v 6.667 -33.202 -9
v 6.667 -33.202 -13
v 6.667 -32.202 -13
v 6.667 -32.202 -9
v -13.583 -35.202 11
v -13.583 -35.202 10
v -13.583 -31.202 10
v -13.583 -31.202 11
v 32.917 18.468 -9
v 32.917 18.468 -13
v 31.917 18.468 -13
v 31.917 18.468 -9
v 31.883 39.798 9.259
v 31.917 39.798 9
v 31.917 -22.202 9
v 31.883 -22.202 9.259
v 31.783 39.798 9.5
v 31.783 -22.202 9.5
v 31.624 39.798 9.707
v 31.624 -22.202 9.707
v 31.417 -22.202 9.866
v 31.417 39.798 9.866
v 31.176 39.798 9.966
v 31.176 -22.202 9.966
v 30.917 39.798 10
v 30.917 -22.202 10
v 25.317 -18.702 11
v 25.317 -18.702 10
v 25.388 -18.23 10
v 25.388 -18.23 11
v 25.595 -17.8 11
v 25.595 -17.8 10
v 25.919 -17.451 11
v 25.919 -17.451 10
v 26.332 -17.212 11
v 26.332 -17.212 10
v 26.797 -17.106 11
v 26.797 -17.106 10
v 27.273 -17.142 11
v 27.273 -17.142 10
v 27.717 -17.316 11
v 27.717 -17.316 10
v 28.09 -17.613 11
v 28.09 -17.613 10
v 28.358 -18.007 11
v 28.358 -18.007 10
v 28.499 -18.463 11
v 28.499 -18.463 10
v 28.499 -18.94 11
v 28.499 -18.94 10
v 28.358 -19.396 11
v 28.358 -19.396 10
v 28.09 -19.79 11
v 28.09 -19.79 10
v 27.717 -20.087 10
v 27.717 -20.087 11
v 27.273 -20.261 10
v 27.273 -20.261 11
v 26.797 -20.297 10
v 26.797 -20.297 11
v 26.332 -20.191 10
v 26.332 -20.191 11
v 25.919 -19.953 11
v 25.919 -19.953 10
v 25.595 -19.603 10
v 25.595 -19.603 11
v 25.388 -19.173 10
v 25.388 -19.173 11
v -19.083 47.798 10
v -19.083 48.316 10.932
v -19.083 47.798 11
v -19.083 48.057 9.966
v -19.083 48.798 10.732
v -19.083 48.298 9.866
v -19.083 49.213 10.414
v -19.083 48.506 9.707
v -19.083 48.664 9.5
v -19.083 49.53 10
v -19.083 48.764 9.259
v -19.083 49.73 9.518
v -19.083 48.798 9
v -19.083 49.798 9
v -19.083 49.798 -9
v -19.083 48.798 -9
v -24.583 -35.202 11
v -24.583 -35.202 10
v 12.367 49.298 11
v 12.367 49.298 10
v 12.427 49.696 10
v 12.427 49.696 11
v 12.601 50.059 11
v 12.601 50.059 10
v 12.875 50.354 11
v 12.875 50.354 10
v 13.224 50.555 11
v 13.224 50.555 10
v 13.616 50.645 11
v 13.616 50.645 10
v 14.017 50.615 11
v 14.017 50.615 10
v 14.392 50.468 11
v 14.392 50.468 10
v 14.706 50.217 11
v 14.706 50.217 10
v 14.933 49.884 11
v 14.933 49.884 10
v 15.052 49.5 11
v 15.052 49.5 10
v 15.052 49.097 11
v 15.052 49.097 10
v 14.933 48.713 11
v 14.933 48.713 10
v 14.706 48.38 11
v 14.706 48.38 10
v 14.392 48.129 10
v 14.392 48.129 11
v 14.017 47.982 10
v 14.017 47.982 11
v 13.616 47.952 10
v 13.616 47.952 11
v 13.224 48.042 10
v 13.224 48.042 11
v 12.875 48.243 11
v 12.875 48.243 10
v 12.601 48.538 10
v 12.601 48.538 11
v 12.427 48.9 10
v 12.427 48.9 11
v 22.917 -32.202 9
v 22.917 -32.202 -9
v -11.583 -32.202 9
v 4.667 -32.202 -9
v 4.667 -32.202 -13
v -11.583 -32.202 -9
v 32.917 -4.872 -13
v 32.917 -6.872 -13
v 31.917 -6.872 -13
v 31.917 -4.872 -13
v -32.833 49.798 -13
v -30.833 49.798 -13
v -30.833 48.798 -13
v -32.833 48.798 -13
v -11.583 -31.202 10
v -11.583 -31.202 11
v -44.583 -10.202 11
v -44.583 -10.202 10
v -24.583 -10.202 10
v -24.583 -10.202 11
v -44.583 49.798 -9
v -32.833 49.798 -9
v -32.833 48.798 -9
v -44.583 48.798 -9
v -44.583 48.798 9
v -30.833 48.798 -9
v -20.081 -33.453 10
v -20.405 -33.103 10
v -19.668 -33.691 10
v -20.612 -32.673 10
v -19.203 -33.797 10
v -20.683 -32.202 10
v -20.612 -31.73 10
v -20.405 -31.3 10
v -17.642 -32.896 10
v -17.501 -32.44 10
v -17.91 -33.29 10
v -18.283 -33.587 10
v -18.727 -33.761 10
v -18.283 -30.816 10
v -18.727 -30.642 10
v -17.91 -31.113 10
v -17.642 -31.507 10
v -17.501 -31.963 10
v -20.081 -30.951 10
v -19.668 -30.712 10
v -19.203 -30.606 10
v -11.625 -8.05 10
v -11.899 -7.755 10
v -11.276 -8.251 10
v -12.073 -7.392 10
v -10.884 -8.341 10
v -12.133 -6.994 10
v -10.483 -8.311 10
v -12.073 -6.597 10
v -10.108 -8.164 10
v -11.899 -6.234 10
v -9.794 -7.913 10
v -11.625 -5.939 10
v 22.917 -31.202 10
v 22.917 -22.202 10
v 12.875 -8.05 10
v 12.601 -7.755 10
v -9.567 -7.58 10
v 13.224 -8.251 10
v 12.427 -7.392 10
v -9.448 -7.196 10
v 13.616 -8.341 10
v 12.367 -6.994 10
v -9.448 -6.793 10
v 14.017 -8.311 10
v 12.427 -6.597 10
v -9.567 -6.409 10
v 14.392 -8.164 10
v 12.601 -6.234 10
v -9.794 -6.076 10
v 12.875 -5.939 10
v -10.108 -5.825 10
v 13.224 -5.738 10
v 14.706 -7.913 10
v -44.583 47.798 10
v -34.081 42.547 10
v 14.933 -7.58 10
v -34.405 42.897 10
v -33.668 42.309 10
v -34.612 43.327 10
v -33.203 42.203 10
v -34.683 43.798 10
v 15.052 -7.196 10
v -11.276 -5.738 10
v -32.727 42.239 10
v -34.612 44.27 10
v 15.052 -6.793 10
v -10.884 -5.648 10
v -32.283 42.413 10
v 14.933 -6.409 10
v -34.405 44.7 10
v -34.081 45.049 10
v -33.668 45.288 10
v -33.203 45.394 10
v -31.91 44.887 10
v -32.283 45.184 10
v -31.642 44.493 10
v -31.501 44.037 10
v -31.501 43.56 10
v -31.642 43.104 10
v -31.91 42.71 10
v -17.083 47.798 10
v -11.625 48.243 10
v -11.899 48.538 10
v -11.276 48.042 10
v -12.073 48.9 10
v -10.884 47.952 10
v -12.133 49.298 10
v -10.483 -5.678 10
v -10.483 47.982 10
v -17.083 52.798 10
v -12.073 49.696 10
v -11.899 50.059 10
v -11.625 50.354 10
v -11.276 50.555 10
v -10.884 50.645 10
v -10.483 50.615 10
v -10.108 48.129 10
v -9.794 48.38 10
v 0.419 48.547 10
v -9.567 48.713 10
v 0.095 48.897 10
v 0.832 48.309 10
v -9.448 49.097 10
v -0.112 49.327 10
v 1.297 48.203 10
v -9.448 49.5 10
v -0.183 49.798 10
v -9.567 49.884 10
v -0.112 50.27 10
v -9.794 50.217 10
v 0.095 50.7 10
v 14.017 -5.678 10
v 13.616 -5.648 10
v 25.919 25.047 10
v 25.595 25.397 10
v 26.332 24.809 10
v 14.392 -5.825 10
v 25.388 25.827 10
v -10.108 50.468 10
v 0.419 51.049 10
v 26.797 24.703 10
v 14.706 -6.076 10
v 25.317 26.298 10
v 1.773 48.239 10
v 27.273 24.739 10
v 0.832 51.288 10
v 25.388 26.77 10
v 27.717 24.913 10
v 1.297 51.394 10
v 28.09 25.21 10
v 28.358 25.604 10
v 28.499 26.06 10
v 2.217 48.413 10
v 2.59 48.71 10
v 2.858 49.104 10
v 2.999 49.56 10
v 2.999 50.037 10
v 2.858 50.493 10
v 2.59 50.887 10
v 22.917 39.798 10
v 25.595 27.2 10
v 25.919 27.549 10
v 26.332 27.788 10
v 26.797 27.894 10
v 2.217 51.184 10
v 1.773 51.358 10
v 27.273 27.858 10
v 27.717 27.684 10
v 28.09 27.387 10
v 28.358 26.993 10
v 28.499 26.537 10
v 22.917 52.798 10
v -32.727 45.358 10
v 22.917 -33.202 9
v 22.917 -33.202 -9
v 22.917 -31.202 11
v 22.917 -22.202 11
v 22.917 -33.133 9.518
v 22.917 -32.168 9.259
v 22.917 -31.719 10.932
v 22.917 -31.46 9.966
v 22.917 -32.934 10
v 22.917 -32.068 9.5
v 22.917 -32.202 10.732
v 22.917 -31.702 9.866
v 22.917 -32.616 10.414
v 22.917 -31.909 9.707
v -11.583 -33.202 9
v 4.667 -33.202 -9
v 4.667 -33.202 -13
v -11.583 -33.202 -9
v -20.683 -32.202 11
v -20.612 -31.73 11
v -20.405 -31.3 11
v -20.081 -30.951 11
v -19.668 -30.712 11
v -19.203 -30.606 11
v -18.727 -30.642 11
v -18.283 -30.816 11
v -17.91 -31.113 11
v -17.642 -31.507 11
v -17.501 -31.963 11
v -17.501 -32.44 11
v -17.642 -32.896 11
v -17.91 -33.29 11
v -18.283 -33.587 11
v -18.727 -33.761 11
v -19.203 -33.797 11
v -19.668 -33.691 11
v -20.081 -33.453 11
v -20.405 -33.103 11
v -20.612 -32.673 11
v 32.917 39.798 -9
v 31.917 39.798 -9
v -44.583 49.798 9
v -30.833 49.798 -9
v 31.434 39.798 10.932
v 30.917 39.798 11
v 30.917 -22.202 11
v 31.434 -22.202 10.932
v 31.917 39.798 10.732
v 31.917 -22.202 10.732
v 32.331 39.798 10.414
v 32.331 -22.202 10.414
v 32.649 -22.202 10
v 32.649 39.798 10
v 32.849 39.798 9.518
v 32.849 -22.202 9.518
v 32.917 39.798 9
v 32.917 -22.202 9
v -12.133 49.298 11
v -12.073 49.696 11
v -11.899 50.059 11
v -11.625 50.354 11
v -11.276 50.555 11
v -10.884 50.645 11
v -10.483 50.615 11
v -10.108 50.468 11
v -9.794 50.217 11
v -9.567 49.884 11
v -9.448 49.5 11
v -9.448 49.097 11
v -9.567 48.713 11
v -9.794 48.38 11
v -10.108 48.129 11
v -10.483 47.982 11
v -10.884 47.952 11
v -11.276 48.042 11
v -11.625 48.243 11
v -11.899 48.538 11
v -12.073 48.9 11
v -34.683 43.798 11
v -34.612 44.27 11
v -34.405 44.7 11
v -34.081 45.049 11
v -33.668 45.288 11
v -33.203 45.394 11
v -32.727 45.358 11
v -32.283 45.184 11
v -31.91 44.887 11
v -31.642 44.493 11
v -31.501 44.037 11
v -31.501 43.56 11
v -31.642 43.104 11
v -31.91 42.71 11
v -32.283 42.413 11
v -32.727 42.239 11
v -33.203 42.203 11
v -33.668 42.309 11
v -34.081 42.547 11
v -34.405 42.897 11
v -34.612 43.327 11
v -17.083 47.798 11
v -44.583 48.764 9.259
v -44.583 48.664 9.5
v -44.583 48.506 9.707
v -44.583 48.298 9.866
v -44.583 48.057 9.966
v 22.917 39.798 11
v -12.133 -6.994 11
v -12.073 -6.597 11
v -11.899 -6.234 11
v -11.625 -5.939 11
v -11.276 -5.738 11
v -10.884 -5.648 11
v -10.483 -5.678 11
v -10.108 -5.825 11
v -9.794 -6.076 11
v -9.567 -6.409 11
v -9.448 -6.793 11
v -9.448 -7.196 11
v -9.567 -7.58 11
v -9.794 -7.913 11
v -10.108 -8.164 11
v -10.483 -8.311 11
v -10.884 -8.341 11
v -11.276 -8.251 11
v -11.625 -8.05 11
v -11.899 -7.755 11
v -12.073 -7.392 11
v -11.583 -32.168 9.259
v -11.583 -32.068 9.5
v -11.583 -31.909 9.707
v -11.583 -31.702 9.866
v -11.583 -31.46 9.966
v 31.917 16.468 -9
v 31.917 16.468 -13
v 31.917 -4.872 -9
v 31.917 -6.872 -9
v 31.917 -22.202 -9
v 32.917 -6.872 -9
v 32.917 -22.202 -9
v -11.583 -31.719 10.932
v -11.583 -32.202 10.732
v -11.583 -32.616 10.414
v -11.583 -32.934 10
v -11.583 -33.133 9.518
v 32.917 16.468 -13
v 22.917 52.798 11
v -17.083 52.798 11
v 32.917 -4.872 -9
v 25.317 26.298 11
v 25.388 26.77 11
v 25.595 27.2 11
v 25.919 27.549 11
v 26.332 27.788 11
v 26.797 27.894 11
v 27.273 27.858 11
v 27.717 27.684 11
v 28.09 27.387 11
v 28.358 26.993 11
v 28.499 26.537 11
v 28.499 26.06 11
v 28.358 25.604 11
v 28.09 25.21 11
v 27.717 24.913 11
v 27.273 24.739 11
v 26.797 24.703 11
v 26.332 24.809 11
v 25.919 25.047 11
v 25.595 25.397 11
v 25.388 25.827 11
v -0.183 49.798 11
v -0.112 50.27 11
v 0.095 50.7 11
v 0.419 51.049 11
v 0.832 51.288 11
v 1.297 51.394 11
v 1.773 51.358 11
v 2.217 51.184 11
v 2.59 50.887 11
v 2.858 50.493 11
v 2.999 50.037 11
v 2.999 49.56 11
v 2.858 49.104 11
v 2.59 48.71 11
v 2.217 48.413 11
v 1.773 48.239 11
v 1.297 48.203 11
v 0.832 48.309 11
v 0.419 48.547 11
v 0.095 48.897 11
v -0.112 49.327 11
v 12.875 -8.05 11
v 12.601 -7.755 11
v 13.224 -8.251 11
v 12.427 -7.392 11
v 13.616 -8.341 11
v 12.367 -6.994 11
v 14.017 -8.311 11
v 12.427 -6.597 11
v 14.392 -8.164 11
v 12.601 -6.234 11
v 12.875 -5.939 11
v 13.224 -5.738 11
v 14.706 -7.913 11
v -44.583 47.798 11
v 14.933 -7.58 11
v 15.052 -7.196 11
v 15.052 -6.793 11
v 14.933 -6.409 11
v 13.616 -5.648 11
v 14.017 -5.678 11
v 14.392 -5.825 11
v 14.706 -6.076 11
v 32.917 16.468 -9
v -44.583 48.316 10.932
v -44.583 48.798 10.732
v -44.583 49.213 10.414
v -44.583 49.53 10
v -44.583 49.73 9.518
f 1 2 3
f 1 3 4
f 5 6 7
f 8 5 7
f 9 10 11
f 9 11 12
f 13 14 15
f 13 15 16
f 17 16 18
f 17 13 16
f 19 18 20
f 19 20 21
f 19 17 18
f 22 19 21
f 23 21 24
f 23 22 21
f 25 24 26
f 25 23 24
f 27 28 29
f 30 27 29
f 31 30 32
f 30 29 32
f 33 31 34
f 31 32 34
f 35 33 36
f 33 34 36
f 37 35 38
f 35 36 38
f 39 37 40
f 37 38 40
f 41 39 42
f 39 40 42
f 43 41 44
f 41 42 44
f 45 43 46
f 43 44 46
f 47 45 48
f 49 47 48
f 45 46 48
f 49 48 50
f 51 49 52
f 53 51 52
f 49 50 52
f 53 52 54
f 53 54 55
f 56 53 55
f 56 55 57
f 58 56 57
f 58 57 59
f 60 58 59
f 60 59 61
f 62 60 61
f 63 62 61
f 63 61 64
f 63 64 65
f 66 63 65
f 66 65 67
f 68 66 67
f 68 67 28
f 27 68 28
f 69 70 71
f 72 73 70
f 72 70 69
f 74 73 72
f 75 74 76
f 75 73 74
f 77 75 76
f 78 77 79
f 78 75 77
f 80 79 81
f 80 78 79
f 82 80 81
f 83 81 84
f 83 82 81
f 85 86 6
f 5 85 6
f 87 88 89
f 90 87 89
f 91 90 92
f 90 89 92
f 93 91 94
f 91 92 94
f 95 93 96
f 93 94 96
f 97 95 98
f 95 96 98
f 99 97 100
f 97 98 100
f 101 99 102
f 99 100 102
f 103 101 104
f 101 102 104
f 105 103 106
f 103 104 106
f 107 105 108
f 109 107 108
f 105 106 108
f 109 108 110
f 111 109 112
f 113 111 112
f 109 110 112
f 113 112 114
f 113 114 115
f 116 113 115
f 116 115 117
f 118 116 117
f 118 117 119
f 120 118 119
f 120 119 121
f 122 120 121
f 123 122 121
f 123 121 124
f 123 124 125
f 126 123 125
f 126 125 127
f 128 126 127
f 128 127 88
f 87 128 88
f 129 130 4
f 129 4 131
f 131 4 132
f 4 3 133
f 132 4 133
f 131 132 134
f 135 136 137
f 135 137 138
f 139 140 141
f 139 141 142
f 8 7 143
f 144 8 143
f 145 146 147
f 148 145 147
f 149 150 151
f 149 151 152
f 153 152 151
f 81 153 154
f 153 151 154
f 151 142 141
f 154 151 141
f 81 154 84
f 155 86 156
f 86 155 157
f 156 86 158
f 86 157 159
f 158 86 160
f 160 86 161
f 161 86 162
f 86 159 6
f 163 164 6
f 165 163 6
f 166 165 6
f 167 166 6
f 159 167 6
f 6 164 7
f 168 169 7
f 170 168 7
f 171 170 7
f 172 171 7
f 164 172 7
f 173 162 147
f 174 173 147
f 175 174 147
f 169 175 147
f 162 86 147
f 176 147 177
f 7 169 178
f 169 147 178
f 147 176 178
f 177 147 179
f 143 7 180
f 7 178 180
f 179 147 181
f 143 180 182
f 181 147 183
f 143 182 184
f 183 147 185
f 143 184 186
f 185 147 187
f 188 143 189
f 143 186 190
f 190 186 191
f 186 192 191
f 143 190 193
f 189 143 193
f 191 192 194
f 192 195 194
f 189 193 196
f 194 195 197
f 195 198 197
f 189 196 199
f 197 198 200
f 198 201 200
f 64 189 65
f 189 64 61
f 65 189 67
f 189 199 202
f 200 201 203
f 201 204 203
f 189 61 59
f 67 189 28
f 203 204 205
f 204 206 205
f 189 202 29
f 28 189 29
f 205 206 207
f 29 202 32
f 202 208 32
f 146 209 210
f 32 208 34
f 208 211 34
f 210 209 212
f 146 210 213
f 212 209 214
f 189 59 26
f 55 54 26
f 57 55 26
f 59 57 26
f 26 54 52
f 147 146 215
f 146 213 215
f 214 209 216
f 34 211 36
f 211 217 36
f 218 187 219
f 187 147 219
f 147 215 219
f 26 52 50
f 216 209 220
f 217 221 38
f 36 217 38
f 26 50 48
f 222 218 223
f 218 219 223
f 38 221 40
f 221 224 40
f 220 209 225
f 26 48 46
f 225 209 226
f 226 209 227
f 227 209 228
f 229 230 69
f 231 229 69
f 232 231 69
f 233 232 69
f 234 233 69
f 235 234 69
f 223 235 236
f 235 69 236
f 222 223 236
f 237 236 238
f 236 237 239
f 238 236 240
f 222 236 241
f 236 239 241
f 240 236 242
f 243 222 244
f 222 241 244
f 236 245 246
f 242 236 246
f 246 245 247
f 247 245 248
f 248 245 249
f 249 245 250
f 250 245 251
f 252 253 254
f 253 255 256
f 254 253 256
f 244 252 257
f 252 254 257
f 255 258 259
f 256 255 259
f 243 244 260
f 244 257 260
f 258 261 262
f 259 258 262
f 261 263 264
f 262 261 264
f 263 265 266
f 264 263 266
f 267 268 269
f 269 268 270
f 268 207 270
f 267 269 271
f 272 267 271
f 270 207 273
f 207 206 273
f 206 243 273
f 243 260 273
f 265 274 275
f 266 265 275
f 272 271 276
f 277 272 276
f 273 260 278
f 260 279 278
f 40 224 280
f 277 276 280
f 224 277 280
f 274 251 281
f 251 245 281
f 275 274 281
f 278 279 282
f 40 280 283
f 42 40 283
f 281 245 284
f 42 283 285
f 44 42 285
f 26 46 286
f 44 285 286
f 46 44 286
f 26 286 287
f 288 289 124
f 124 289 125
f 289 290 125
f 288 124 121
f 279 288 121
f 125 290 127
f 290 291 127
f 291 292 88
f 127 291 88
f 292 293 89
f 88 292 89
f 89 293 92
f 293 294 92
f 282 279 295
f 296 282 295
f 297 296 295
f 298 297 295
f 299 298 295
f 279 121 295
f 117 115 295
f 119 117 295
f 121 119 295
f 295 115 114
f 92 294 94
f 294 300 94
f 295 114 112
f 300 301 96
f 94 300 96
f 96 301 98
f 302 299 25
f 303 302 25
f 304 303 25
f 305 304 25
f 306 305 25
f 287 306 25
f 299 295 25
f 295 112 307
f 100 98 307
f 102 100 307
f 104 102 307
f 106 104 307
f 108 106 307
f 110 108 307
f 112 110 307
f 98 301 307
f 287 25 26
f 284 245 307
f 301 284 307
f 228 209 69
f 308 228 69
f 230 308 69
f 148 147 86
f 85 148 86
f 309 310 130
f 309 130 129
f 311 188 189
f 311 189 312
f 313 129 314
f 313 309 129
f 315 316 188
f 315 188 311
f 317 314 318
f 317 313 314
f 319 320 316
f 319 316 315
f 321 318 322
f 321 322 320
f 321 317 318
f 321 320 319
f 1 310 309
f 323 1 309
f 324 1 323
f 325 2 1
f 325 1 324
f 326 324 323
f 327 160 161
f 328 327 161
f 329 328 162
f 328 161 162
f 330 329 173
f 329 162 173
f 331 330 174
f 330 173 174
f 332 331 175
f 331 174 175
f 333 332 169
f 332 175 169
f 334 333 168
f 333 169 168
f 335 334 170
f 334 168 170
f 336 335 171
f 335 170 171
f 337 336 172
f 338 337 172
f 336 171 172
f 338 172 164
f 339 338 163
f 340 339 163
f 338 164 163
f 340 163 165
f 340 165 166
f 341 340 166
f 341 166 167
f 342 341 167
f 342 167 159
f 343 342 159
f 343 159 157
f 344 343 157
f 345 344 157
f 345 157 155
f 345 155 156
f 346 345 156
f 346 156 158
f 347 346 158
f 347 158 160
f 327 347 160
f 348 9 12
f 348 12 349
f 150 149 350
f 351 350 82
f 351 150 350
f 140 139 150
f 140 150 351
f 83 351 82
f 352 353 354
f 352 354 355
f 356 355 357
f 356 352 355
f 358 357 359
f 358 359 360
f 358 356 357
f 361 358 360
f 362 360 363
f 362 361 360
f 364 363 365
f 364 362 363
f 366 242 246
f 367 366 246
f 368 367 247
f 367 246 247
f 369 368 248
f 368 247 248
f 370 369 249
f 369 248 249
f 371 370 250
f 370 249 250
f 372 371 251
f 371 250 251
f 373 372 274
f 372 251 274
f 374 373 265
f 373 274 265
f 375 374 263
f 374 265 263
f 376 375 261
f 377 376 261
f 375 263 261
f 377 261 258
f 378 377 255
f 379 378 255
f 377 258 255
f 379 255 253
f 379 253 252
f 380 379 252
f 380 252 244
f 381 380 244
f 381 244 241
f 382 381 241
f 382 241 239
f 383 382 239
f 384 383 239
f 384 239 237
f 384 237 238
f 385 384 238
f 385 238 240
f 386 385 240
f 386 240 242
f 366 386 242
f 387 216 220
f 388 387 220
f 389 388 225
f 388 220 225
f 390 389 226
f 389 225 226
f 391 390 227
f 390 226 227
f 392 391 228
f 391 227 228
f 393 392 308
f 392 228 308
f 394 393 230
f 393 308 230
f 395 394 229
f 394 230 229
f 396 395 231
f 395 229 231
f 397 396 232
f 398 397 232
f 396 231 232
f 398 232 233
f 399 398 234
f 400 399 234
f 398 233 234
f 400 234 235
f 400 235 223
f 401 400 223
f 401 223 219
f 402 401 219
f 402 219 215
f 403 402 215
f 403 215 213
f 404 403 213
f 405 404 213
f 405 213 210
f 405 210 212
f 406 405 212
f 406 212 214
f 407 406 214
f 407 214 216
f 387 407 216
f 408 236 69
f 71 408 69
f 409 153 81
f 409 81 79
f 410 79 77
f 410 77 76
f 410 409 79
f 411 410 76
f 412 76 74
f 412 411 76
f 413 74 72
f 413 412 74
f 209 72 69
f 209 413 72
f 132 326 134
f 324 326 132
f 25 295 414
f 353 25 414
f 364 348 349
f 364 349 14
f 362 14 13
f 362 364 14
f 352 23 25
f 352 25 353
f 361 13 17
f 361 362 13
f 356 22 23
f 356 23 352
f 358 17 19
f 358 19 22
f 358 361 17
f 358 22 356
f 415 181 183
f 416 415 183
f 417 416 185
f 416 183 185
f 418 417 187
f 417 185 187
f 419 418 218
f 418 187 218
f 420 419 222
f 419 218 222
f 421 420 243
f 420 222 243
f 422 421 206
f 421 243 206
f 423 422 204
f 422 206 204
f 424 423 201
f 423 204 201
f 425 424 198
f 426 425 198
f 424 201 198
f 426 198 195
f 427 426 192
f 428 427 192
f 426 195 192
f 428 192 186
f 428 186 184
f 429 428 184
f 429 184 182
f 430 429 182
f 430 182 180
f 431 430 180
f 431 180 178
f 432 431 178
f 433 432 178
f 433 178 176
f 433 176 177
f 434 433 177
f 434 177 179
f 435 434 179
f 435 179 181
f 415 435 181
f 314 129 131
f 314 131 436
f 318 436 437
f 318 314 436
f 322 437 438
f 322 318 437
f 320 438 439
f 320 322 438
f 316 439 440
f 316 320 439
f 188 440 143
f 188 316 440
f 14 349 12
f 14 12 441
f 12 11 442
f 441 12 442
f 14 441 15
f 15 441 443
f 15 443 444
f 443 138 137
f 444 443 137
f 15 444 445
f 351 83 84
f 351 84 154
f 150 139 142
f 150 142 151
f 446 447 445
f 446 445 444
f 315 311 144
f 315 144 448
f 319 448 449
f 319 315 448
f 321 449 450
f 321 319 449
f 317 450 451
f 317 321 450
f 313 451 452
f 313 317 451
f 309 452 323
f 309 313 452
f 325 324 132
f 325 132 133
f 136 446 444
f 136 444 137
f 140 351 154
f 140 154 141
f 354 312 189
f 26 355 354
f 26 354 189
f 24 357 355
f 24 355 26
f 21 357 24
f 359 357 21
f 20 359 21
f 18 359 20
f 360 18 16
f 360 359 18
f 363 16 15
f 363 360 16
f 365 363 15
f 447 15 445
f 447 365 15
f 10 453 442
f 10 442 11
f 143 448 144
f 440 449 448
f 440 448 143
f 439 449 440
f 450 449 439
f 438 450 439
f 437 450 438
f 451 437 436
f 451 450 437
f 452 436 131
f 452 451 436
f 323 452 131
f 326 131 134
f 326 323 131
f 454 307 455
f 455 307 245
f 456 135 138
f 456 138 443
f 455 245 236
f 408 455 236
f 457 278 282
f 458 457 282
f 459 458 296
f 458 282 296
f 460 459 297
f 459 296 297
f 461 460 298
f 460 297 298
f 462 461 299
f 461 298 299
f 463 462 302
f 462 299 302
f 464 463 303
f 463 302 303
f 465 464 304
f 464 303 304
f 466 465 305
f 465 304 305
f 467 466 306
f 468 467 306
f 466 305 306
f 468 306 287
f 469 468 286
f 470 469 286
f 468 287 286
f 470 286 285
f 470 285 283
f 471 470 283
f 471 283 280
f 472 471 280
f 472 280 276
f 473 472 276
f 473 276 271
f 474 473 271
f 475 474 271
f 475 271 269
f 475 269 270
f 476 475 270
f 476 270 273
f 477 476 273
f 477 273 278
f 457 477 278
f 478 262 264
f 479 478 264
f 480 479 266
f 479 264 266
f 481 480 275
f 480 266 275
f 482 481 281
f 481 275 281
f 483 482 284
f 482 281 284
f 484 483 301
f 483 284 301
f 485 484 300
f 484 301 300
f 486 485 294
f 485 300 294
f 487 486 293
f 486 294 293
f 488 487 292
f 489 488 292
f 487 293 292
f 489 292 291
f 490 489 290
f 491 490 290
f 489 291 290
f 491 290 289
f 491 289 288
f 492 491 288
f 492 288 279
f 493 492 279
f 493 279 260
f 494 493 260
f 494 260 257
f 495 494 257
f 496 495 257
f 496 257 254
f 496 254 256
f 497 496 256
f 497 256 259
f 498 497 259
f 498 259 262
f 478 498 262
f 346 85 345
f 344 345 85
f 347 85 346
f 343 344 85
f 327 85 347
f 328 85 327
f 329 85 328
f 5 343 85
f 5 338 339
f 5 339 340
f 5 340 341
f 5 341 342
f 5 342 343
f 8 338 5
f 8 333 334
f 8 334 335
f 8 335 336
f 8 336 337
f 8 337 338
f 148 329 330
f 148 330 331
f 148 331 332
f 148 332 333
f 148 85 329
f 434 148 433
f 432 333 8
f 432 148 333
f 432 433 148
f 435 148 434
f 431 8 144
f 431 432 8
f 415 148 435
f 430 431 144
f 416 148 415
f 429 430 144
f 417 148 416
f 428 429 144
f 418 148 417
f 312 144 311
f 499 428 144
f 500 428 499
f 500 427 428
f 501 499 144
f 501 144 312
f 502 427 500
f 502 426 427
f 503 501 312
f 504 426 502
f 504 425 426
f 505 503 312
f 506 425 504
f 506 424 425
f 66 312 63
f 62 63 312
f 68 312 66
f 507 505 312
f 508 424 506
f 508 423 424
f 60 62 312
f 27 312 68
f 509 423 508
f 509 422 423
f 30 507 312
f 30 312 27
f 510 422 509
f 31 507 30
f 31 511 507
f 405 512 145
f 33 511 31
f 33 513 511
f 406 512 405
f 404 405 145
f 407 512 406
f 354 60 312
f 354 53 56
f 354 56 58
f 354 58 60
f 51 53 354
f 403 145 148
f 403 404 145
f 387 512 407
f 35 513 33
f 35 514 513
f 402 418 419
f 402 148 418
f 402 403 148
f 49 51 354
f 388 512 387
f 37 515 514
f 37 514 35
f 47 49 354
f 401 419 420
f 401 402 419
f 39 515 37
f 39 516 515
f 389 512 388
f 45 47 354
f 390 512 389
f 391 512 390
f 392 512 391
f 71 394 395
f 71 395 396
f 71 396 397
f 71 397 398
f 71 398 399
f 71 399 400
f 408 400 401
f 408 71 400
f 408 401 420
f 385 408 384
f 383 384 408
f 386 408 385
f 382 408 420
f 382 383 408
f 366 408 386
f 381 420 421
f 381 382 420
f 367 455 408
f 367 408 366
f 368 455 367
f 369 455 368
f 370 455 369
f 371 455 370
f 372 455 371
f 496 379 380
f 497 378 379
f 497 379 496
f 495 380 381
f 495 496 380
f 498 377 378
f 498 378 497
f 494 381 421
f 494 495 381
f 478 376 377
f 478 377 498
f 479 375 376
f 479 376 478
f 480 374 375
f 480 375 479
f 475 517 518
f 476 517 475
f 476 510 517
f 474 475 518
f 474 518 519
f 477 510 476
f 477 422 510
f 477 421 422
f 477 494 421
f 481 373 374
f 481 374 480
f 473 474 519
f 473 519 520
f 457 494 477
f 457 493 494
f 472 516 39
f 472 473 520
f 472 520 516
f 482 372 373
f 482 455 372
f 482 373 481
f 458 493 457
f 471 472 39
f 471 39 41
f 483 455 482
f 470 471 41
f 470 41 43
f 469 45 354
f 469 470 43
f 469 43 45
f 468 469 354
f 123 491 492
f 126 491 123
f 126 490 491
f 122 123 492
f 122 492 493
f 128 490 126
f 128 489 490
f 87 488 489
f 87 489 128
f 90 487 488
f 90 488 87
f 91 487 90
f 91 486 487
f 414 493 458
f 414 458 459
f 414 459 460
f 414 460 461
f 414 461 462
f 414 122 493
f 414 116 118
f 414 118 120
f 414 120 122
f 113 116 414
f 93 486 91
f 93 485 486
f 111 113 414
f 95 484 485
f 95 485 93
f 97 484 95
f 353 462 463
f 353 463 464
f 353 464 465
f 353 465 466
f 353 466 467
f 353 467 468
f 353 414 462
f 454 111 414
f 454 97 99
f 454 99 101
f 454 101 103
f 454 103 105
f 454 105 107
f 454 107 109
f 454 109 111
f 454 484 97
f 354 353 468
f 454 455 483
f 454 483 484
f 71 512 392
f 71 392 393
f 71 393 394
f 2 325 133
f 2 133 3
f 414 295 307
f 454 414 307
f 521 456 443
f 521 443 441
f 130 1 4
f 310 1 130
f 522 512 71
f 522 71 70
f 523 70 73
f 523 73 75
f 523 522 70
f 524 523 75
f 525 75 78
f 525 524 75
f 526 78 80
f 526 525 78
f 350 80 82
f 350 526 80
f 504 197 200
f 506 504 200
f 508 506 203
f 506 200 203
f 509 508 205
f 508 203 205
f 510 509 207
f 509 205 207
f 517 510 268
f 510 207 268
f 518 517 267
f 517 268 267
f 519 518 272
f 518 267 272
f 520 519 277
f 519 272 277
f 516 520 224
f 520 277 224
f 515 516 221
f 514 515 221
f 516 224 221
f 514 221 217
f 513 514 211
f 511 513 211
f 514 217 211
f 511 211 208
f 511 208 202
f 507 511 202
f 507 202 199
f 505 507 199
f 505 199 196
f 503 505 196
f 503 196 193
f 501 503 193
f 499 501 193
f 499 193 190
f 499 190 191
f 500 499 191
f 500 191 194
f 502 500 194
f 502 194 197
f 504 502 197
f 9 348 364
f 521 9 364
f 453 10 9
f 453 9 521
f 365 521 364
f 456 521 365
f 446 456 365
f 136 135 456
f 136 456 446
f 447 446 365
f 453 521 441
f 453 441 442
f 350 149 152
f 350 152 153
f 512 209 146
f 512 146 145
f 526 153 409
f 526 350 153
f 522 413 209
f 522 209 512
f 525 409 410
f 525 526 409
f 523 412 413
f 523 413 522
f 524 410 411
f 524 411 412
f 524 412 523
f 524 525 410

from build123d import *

# Parameters (mm, degrees)
BOSS_EXTRUDE2_DEPTH            = 1
F_3_2_3_2_DIAMETER_HOLE1_D     = 3.2
F_3_2_3_2_DIAMETER_HOLE1_DEPTH = 1.6
F_3_2_3_2_DIAMETER_HOLE1_TIP   = 0.96137699
F_2_7_2_7_DIAMETER_HOLE1_D     = 2.7
F_2_7_2_7_DIAMETER_HOLE1_DEPTH = 1.6
F_2_7_2_7_DIAMETER_HOLE1_TIP   = 0.811161836
EDGE_FLANGE1_DEPTH             = 62
EDGE_FLANGE1_START             = 1
EDGE_FLANGE1_FLAT_DEPTH        = 1
EDGE_FLANGE1_BEND_DEPTH        = 25.5
EDGE_FLANGE1_FLAT_2_DEPTH      = 1
EDGE_FLANGE1_BEND_2_DEPTH      = 34.5
EDGE_FLANGE1_FLAT_3_DEPTH      = 1


# Sheet-metal steps are written as plain solids
with BuildPart() as part:
    # Sketch1 → Boss-Extrude2 (new body)
    with BuildSketch(Plane.XY.offset(10)):
        Polygon((-44.583280636, -10.201603144), (-24.583280636, -10.201603144), (-24.583280636, -35.201603144), (-13.583280636, -35.201603144), (-13.583280636, -31.201603144), (22.916719364, -31.201603144), (22.916719364, -22.201603144), (30.916719364, -22.201603144), (30.916719364, 39.798396856), (22.916719364, 39.798396856), (22.916719364, 52.798396856), (-17.083280636, 52.798396856), (-17.083280636, 47.798396856), (-44.583280636, 47.798396856), align=None)
    extrude(amount=BOSS_EXTRUDE2_DEPTH)

    # Ø3.2 (3.2) Diameter Hole1
    with Locations(Plane.XY.offset(11)):
        with Locations((-33.083280636, 43.798396856), (26.916719364, 26.298396856), (26.916719364, -18.701603144), (1.416719364, 49.798396856), (-19.083280636, -32.201603144)):
            Hole(F_3_2_3_2_DIAMETER_HOLE1_D / 2, depth=F_3_2_3_2_DIAMETER_HOLE1_DEPTH)
            with Locations((0, 0, -(F_3_2_3_2_DIAMETER_HOLE1_DEPTH + F_3_2_3_2_DIAMETER_HOLE1_TIP / 2))):  # 118° drill point
                Cone(0, F_3_2_3_2_DIAMETER_HOLE1_D / 2, F_3_2_3_2_DIAMETER_HOLE1_TIP, mode=Mode.SUBTRACT)

    # Ø2.7 (2.7) Diameter Hole1
    with Locations(Plane.XY.offset(11)):
        with Locations((-10.783280636, -6.994496363), (13.716719364, -6.994496363), (-10.783280636, 49.298396856), (13.716719364, 49.298396856)):
            Hole(F_2_7_2_7_DIAMETER_HOLE1_D / 2, depth=F_2_7_2_7_DIAMETER_HOLE1_DEPTH)
            with Locations((0, 0, -(F_2_7_2_7_DIAMETER_HOLE1_DEPTH + F_2_7_2_7_DIAMETER_HOLE1_TIP / 2))):  # 118° drill point
                Cone(0, F_2_7_2_7_DIAMETER_HOLE1_D / 2, F_2_7_2_7_DIAMETER_HOLE1_TIP, mode=Mode.SUBTRACT)

    # Edge-Flange1 bend section (across the edge) → Edge-Flange1 (add)
    with BuildSketch(Plane(origin=(31.916719364, 39.798396856, 10), x_dir=(-1, 0, 0), z_dir=(0, -1, 0))):
        with BuildLine():
            Line((-1, 1), (0, 1))
            ThreePointArc((0, 1), (0.292893219, 0.292893219), (1, 0))
            Line((1, 0), (1, -1))
            ThreePointArc((1, -1), (-0.414213562, -0.414213562), (-1, 1))
        make_face()
    extrude(amount=EDGE_FLANGE1_DEPTH)

    # Edge-Flange1 profile (on flange) → Edge-Flange1 flat (add)
    with BuildSketch(Plane(origin=(31.916719364, 0, 10), x_dir=(0, -1, 0), z_dir=(1, 0, 0)).offset(EDGE_FLANGE1_START)):
        Polygon((-39.798396856, 1), (22.201603144, 1), (22.201603144, 19), (6.871603144, 19), (6.871603144, 23), (4.871603144, 23), (4.871603144, 19), (-16.468396856, 19), (-16.468396856, 23), (-18.468396856, 23), (-18.468396856, 19), (-39.798396856, 19), align=None)
    extrude(amount=-EDGE_FLANGE1_FLAT_DEPTH)

    # Edge-Flange1 bend section 2 (across the edge) → Edge-Flange1 bend (add)
    with BuildSketch(Plane(origin=(-44.583280636, 48.798396856, 10), x_dir=(0, -1, 0), z_dir=(1, 0, 0))):
        with BuildLine():
            Line((-1, 1), (0, 1))
            ThreePointArc((0, 1), (0.292893219, 0.292893219), (1, 0))
            Line((1, 0), (1, -1))
            ThreePointArc((1, -1), (-0.414213562, -0.414213562), (-1, 1))
        make_face()
    extrude(amount=EDGE_FLANGE1_BEND_DEPTH)

    # Edge-Flange1 profile 2 (on flange) → Edge-Flange1 flat 2 (add)
    with BuildSketch(Plane(origin=(0, 48.798396856, 10), x_dir=(1, 0, 0), z_dir=(0, 1, 0)).offset(EDGE_FLANGE1_START)):
        Polygon((-19.083280636, 1), (-19.083280636, 19), (-30.833280636, 19), (-30.833280636, 23), (-32.833280636, 23), (-32.833280636, 19), (-44.583280636, 19), (-44.583280636, 1), align=None)
    extrude(amount=-EDGE_FLANGE1_FLAT_2_DEPTH)

    # Edge-Flange1 bend section 3 (across the edge) → Edge-Flange1 bend 2 (add)
    with BuildSketch(Plane(origin=(22.916719364, -32.201603144, 10), x_dir=(0, 1, 0), z_dir=(-1, 0, 0))):
        with BuildLine():
            Line((-1, 1), (0, 1))
            ThreePointArc((0, 1), (0.292893219, 0.292893219), (1, 0))
            Line((1, 0), (1, -1))
            ThreePointArc((1, -1), (-0.414213562, -0.414213562), (-1, 1))
        make_face()
    extrude(amount=EDGE_FLANGE1_BEND_2_DEPTH)

    # Edge-Flange1 profile 3 (on flange) → Edge-Flange1 flat 3 (add)
    with BuildSketch(Plane(origin=(0, -32.201603144, 10), x_dir=(-1, 0, 0), z_dir=(0, -1, 0)).offset(EDGE_FLANGE1_START)):
        Polygon((11.583280636, 1), (11.583280636, 19), (-4.666719364, 19), (-4.666719364, 23), (-6.666719364, 23), (-6.666719364, 19), (-22.916719364, 19), (-22.916719364, 1), align=None)
    extrude(amount=-EDGE_FLANGE1_FLAT_3_DEPTH)


solid = part.part
